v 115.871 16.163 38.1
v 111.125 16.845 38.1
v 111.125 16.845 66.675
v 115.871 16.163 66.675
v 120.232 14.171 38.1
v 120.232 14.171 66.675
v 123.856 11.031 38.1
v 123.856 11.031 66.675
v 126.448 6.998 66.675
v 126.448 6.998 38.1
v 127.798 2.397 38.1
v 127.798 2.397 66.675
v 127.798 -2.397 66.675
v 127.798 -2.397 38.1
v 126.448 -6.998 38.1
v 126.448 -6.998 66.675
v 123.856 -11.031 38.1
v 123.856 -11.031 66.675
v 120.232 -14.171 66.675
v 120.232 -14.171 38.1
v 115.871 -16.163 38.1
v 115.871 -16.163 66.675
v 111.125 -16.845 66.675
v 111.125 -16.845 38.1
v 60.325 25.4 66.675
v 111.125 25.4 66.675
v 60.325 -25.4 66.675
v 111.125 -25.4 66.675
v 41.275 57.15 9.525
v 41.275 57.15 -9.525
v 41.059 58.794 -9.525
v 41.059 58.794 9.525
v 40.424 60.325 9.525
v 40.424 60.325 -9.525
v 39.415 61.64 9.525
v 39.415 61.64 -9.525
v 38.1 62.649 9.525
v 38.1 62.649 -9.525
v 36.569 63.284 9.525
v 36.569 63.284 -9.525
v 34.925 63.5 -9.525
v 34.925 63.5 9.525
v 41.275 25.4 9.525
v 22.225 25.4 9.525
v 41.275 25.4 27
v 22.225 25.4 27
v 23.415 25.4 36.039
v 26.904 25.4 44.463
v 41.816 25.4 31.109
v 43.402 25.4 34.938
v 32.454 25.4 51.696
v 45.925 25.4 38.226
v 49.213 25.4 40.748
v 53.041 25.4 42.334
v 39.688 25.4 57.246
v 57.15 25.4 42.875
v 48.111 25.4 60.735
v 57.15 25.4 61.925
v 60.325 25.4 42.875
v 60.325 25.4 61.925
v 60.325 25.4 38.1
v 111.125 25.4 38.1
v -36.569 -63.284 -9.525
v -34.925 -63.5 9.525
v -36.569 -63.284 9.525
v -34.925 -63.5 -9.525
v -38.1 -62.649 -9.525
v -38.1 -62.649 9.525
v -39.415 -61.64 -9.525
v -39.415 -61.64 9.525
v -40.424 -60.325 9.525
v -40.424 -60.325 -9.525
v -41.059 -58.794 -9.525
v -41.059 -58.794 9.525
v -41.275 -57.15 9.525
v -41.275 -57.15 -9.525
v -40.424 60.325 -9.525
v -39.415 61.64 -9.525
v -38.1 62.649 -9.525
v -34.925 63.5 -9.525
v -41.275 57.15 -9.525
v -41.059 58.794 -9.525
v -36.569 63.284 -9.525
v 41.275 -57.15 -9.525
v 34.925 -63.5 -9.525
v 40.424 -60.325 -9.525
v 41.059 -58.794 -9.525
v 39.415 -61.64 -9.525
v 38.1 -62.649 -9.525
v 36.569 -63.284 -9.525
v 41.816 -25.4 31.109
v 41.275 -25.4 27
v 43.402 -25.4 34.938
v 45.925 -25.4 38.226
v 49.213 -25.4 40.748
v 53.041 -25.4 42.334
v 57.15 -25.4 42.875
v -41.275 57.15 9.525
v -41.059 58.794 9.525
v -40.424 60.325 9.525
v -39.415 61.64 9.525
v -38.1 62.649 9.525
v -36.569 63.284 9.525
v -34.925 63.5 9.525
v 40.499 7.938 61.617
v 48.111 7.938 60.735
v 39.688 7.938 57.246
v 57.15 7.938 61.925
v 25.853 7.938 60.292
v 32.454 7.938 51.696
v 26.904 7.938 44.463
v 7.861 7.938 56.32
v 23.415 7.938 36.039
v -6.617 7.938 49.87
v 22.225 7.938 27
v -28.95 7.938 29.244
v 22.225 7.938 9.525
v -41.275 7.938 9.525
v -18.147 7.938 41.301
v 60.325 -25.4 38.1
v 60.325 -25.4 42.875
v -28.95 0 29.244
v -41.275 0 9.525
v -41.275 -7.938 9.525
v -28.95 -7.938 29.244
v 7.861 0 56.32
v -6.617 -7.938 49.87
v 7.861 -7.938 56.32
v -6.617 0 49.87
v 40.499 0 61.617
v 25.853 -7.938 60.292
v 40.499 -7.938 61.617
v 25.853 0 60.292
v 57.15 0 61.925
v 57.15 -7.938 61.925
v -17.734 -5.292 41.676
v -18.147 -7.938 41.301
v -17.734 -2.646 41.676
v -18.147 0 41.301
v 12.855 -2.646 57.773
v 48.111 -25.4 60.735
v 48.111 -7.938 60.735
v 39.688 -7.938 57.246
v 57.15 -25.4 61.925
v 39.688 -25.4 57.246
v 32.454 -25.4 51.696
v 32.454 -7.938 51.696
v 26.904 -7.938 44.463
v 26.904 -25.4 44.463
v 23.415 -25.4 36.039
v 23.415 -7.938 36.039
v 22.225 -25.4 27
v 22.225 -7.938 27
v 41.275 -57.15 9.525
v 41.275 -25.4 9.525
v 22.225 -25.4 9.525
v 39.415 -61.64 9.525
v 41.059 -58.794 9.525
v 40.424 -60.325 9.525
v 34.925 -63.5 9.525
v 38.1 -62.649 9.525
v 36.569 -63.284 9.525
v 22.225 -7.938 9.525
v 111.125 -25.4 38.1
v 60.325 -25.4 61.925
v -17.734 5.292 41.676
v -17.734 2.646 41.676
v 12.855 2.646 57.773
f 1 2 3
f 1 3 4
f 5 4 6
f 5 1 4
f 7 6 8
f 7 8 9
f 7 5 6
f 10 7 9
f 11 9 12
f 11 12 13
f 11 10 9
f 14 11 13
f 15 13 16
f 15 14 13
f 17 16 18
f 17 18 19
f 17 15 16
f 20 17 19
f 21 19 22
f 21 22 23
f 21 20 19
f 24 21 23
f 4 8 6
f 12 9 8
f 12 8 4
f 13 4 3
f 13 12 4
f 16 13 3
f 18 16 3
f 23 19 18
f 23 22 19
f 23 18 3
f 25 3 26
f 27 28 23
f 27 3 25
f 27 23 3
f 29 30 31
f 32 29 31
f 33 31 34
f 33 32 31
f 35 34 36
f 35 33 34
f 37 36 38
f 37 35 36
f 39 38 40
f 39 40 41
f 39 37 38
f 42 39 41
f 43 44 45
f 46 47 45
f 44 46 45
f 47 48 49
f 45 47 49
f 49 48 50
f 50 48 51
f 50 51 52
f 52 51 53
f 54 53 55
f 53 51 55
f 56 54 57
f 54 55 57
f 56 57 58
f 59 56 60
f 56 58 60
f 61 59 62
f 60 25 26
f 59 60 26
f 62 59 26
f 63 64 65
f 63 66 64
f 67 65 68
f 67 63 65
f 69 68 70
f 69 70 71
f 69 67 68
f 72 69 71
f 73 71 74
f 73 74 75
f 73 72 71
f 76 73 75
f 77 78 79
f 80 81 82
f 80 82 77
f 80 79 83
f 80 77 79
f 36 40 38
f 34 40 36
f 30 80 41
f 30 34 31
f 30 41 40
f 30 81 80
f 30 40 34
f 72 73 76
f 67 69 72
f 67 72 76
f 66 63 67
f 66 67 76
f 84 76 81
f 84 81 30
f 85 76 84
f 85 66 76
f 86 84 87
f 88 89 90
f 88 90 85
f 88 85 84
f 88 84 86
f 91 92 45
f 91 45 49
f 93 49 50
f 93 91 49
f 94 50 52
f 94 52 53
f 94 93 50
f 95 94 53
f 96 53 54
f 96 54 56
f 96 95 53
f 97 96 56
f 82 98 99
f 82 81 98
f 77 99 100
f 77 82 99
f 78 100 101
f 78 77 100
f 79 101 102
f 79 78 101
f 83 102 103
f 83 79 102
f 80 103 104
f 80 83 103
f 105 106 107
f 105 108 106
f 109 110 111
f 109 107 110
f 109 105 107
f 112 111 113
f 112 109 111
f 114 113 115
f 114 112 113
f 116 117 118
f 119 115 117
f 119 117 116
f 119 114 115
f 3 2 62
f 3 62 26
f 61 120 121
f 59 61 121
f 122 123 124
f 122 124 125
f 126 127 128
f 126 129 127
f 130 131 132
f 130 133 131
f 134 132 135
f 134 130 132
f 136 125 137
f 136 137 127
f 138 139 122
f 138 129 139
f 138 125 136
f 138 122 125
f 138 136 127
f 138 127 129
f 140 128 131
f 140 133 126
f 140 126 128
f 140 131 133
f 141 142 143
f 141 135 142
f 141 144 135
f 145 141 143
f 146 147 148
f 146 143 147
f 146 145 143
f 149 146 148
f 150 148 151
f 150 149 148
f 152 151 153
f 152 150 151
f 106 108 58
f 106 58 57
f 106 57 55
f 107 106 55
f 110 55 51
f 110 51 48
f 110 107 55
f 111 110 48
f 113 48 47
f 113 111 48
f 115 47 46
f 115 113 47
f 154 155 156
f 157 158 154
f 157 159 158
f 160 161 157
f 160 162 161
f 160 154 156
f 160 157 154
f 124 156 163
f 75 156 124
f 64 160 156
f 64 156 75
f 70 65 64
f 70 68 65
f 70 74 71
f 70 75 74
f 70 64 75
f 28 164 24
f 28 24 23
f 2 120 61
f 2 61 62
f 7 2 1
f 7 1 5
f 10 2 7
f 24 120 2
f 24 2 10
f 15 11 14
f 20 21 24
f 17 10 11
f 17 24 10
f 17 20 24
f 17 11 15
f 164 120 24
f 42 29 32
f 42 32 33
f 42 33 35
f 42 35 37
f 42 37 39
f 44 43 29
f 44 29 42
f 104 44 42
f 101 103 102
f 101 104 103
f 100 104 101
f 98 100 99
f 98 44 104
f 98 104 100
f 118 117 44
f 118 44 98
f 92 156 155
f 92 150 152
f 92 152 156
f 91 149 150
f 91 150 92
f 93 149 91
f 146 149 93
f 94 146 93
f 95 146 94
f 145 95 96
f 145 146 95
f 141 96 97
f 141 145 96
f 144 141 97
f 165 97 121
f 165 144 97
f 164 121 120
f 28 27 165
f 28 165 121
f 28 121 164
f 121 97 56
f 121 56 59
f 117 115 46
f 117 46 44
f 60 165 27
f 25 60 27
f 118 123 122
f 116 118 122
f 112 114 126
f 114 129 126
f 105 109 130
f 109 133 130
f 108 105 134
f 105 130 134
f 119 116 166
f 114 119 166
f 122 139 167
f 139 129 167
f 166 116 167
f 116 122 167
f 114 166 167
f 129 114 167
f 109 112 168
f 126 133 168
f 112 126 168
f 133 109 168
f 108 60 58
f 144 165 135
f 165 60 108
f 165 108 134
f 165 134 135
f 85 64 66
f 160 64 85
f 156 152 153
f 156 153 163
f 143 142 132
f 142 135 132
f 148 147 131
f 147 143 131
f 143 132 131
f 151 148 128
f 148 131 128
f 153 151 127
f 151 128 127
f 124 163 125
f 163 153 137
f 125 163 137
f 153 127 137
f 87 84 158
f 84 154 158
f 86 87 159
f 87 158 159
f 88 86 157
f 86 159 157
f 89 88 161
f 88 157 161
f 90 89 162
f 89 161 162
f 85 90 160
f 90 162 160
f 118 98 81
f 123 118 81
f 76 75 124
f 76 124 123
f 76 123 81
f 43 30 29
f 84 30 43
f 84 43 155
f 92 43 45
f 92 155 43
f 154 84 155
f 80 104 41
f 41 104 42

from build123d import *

# Parameters (mm, degrees)
F1_DEPTH = 63.5
F2_DEPTH = 7.9375
F0_W     = 33.9550597797
F0_H     = 4.7752
F0_H_2   = 19.05
F0_H_3   = 4.7498
F3_DEPTH = 25.4
F5_R     = 6.35


with BuildPart() as f1:
    # F0 (on Front) → F1 (new body, symmetric)
    with BuildSketch(Plane.XZ):
        Polygon((-41.275, 9.525), (-41.275, -9.525), (41.275, -9.525), (41.275, 9.525), (22.225, 9.525), align=None)
    extrude(amount=F1_DEPTH, both=True)

    # F0 (on Front) → F2 (join, symmetric)
    with BuildSketch(Plane.XZ):
        with BuildLine():
            add(Edge.make_bspline(
                [(-41.275, 9.525), (-19.039621679, 51.0745784103), (3.7831389959, 62.3737565157), (57.15, 61.9252)],
                knots=[0, 0, 0, 0, 111.5045361635, 111.5045361635, 111.5045361635, 111.5045361635], degree=3))
            Line((-41.275, 9.525), (22.225, 9.525))
            Line((22.225, 9.525), (22.225, 27.0002))
            ThreePointArc((22.225, 27.0002), (32.4542956671, 51.6959043329), (57.15, 61.9252))
        make_face()
    extrude(amount=F2_DEPTH, both=True)

    # F0 (on Front) → F3 (join, symmetric)
    with BuildSketch(Plane.XZ):
        with BuildLine():
            Line((22.225, 9.525), (41.275, 9.525))
            Line((41.275, 9.525), (41.275, 27.0002))
            ThreePointArc((41.275, 27.0002), (45.9246798487, 38.2255201513), (57.15, 42.8752))
            Line((57.15, 42.8752), (60.325, 42.8752))
            Line((60.325, 42.8752), (60.325, 61.9252))
            Line((60.325, 61.9252), (57.15, 61.9252))
            ThreePointArc((57.15, 61.9252), (32.4542956671, 51.6959043329), (22.225, 27.0002))
            Line((22.225, 27.0002), (22.225, 9.525))
        make_face()
        with Locations((77.3025298899, 40.4876)):
            Rectangle(F0_W, F0_H)
        with Locations((77.3025298899, 52.4002)):
            Rectangle(F0_W, F0_H_2)
        with Locations((77.3025298899, 64.3001)):
            Rectangle(F0_W, F0_H_3)
        Polygon((94.2800597797, 66.675), (94.2800597797, 61.9252), (94.2800597797, 42.8752), (94.2800597797, 38.1), (111.125, 38.1), (111.125, 66.675), align=None)
    extrude(amount=F3_DEPTH, both=True)

    # F0 (on Front) → F4 (revolve)
    with BuildSketch(Plane.XZ):
        Polygon((94.2800597797, 66.675), (94.2800597797, 61.9252), (94.2800597797, 42.8752), (94.2800597797, 38.1), (111.125, 38.1), (111.125, 66.675), align=None)
    revolve(axis=Axis((111.125, 0, 52.3875), (0, 0, -1)))

    # F5
    f5_edges = [f1.edges().sort_by_distance(p)[0] for p in [
        (-41.275, 63.5, 0),
        (-41.275, -63.5, 0),
        (41.275, -63.5, 0),
        (41.275, 63.5, 0),
    ]]
    fillet(f5_edges, radius=F5_R)


solid = f1.part
